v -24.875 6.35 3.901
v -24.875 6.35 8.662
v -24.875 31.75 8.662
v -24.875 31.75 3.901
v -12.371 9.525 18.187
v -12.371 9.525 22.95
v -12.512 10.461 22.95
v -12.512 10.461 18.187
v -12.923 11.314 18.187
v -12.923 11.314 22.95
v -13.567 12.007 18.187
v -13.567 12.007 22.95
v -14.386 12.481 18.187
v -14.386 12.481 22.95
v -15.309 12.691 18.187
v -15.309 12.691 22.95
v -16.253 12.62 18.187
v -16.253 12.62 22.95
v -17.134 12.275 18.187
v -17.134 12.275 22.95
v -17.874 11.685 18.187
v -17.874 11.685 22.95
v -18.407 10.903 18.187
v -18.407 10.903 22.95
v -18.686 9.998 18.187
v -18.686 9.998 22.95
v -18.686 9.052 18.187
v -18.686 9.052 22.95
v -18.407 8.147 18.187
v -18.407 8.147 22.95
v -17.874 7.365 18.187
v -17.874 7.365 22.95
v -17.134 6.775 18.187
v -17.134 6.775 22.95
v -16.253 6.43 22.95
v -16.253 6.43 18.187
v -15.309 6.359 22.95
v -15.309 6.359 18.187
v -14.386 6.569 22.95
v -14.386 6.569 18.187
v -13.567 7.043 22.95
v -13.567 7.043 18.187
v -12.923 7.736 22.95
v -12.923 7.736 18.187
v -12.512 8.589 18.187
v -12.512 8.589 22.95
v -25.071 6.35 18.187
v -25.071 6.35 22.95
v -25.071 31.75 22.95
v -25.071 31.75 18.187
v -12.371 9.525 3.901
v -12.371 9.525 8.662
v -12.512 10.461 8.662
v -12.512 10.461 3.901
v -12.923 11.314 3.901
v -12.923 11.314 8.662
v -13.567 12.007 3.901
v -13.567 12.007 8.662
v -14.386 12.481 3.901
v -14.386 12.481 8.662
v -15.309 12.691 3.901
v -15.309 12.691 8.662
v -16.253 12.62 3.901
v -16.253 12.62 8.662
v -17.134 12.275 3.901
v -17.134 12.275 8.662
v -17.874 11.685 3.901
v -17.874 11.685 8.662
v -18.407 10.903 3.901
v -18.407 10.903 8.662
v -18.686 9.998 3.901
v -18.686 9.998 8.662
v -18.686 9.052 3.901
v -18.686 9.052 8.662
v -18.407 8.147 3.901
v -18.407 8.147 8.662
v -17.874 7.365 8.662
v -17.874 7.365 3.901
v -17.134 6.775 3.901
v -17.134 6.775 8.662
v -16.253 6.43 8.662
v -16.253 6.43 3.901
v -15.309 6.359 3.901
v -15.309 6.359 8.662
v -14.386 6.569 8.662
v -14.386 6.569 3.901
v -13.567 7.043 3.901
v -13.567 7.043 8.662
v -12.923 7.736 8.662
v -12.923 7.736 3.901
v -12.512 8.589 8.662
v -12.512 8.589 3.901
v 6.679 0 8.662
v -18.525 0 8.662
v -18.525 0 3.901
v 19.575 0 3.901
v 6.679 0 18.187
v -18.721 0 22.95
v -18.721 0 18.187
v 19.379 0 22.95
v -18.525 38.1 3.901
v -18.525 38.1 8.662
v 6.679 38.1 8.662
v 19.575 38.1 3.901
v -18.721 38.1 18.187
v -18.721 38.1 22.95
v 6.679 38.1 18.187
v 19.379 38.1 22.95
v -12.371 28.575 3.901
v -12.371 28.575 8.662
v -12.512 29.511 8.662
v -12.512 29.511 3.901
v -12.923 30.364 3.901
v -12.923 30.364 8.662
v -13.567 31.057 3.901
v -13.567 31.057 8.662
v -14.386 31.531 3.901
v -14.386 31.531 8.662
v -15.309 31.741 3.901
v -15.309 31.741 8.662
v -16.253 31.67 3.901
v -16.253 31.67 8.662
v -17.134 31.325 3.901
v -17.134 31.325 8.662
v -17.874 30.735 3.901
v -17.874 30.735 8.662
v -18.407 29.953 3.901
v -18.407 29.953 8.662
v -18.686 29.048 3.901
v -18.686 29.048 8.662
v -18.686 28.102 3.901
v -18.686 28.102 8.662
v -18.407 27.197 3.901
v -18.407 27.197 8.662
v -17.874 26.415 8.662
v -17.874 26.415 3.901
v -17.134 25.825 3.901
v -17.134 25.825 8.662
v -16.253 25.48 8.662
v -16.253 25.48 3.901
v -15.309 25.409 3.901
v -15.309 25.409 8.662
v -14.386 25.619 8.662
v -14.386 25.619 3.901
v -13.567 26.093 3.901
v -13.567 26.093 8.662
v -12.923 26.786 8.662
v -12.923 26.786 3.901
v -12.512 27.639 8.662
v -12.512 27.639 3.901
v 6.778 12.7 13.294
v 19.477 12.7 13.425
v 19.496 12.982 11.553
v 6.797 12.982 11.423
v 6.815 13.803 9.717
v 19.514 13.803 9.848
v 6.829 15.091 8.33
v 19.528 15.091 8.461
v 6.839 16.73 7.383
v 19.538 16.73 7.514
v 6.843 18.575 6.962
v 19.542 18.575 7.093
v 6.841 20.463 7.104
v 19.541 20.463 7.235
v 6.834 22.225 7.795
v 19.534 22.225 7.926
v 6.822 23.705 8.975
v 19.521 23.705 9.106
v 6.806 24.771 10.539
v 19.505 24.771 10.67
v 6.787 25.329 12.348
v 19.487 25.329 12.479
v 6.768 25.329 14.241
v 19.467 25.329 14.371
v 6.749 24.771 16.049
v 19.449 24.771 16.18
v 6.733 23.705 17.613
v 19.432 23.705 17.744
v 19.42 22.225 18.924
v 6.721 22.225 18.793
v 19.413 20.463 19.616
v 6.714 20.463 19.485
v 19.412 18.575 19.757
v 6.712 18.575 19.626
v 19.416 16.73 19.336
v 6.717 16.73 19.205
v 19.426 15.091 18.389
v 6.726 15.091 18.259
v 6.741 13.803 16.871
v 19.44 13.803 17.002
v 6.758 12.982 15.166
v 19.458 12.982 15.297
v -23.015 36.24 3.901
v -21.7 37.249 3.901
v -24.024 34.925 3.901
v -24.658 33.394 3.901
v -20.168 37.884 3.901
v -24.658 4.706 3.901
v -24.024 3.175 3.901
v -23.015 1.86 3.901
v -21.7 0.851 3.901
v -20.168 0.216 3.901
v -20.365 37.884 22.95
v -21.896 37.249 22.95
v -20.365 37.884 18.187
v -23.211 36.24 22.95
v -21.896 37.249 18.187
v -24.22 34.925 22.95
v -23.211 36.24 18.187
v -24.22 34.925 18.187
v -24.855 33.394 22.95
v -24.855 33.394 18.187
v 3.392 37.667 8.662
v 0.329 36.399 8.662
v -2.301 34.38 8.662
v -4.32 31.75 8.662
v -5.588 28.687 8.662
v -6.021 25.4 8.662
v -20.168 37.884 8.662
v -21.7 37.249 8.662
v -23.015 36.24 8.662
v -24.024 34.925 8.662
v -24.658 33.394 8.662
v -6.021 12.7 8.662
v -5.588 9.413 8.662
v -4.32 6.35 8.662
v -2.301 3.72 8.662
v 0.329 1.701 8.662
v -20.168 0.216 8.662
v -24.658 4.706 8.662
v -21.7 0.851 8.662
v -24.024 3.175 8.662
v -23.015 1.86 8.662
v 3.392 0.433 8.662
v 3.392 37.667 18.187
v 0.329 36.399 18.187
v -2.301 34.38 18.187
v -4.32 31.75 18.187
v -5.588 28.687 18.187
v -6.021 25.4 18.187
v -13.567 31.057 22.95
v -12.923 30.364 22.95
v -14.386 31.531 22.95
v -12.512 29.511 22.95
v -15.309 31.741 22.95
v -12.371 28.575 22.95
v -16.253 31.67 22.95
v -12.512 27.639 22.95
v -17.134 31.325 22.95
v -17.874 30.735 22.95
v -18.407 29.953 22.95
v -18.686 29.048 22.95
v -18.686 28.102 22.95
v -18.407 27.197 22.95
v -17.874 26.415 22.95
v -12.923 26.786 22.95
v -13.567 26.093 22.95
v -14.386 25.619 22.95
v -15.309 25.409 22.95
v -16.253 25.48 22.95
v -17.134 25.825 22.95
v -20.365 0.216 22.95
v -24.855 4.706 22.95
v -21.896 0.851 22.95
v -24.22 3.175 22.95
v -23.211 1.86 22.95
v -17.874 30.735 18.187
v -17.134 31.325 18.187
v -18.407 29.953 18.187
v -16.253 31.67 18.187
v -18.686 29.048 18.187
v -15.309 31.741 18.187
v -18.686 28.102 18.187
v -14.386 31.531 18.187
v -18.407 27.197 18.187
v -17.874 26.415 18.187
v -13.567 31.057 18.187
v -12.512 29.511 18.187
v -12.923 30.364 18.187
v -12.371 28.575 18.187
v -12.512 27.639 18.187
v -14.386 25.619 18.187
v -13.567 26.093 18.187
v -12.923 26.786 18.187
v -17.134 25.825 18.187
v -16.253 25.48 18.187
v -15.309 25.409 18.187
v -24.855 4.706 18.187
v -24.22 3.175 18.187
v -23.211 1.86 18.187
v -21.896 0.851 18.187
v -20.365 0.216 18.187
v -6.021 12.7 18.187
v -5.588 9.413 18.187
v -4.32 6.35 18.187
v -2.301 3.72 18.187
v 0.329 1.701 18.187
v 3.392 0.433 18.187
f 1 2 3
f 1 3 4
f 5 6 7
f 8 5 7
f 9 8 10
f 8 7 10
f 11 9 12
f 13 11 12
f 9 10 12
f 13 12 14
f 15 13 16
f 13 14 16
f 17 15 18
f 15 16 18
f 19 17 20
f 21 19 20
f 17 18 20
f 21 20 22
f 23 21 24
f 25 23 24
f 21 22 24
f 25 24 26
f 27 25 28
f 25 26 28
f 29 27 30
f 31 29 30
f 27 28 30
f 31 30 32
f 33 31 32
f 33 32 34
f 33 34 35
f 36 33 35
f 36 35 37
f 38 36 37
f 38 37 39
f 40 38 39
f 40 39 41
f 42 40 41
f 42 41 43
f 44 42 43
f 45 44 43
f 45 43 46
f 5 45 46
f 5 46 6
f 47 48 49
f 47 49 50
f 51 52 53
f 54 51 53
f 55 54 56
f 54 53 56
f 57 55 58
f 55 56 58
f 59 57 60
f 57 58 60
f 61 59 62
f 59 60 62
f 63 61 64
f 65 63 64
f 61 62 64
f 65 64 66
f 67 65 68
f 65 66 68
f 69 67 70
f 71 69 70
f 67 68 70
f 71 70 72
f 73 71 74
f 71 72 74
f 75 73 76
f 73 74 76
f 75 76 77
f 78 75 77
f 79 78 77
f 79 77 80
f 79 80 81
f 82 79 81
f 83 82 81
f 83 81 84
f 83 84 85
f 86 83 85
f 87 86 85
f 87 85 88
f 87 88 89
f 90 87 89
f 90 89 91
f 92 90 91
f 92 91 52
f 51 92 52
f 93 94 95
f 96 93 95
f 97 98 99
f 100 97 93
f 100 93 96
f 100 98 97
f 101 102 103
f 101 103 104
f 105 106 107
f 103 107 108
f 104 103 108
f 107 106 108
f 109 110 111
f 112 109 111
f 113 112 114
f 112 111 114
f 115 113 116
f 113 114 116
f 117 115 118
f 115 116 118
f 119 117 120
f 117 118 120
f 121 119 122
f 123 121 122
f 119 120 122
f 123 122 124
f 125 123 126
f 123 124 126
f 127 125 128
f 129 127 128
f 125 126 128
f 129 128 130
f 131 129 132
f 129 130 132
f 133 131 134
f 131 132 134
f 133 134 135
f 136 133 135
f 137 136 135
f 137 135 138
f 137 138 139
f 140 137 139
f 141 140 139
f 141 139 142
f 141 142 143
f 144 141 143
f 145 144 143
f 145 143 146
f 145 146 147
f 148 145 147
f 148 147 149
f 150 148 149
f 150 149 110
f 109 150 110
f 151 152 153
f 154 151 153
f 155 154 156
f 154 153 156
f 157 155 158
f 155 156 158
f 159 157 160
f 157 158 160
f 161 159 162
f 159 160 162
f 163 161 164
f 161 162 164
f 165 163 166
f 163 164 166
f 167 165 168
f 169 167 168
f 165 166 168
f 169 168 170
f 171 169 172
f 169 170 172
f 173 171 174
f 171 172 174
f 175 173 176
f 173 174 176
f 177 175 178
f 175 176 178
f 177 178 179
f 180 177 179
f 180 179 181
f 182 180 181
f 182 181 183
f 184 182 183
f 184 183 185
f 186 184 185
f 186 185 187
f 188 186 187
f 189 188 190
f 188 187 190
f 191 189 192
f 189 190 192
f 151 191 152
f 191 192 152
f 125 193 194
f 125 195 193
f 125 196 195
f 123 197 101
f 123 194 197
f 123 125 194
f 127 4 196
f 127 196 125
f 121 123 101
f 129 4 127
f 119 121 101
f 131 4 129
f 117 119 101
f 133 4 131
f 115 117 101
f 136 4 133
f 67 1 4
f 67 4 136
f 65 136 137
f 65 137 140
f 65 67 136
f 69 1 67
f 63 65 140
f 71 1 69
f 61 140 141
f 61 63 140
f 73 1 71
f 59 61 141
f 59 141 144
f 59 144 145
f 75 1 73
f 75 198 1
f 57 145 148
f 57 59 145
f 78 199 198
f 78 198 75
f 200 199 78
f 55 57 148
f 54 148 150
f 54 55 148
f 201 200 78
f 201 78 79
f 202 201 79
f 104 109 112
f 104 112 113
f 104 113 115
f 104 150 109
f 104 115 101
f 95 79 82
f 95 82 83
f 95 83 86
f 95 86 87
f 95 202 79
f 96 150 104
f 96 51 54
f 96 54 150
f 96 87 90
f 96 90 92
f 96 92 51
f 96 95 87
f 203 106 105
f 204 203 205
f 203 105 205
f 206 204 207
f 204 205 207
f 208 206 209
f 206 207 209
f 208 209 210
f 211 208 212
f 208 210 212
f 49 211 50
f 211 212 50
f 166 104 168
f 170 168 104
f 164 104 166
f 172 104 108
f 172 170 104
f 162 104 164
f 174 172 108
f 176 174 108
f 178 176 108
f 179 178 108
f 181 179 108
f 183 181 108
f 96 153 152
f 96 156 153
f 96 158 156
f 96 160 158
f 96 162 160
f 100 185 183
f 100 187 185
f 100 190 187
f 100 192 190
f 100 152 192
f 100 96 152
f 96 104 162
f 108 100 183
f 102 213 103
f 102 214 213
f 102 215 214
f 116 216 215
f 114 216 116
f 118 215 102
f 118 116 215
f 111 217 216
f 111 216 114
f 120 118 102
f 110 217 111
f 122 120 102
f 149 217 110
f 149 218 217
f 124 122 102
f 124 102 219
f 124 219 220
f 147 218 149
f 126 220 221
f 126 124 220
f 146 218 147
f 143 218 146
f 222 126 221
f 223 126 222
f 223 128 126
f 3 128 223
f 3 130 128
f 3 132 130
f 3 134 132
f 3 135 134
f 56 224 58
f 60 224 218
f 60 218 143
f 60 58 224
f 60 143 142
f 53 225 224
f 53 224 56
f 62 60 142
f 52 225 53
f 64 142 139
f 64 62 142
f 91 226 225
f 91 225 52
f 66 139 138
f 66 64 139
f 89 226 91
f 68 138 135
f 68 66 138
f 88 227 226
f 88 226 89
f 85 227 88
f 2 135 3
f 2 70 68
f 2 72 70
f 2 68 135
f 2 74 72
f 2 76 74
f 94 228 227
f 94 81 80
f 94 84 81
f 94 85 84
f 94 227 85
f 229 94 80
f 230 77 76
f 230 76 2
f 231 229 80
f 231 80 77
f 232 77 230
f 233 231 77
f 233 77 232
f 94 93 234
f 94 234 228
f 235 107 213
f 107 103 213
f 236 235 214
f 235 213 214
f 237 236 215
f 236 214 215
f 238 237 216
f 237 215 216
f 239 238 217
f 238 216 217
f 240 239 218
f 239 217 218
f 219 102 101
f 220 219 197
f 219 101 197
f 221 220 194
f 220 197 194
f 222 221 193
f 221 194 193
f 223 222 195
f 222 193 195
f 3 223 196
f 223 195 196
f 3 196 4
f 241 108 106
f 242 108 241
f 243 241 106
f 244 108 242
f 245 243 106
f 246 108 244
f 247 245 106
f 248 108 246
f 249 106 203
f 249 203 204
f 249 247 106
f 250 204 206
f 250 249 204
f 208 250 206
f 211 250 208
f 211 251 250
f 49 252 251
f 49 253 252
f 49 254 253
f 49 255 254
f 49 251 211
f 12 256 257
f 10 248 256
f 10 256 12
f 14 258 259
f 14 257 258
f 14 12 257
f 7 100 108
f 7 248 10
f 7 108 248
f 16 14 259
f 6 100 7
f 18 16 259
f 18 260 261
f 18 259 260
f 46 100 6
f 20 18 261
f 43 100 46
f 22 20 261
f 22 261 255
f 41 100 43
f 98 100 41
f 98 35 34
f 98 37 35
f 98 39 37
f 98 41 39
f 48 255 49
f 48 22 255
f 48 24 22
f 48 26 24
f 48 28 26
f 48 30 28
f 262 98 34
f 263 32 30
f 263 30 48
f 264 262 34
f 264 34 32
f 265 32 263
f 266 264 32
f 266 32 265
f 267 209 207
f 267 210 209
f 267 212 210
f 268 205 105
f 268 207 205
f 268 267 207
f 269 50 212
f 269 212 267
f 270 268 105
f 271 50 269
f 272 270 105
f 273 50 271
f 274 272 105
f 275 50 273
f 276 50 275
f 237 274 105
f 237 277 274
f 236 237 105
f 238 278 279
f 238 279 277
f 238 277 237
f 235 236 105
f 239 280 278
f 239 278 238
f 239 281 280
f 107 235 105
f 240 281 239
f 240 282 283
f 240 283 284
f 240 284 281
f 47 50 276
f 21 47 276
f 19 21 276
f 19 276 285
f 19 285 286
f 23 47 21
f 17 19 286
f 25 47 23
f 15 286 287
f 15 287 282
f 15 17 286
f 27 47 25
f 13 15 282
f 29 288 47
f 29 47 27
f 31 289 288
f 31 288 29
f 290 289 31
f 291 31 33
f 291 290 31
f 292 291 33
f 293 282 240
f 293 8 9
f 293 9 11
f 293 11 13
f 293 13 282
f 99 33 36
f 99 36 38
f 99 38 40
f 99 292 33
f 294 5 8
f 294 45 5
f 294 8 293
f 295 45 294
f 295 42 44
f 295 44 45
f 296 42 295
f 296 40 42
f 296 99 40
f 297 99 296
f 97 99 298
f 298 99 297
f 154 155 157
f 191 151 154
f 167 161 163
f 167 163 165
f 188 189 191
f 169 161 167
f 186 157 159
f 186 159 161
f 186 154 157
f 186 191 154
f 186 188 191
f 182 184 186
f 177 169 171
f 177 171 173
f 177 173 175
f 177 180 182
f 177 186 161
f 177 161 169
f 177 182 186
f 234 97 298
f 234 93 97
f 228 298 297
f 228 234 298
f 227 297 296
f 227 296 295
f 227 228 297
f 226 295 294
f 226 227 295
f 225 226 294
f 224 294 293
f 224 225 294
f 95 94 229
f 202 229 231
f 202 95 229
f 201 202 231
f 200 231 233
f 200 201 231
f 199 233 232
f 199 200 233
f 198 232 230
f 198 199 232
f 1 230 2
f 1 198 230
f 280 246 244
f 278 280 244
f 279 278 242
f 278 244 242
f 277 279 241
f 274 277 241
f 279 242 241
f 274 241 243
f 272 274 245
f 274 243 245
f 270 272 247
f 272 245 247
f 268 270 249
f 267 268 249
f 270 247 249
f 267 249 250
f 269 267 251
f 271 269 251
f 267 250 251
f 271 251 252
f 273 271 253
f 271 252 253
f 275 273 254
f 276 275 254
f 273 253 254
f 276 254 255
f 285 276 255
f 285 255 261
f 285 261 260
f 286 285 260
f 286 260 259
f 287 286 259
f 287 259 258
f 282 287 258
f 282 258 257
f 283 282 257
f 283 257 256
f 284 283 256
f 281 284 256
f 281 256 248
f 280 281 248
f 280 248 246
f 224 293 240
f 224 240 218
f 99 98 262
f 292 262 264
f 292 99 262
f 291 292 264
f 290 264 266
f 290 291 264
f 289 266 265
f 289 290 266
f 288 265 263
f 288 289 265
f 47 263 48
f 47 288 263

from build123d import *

# Parameters (mm, degrees)
F1_DEPTH = 38.1
F2_R     = 3.175
F3_DEPTH = 25.4
F4_R     = 6.35
F6_DEPTH = 12.7
F7_R     = 12.7
F8_R     = 12.7


with BuildPart() as f1:
    # F0 (on Front) → F1 (new body)
    with BuildSketch(Plane.XZ):
        Polygon((19.5751538399, 3.9005766285), (19.3787731311, 22.9495643868), (-25.0712268689, 22.9495643868), (-25.0712268689, 18.1870643868), (-6.0212268689, 18.1870643868), (-6.0212268689, 8.6620643868), (-24.8748461601, 8.6620643868), (-24.8748461601, 3.9005766285), align=None)
    extrude(amount=-F1_DEPTH)

    # F2 (on face) → F3 (cut)
    with BuildSketch(Plane.XY.offset(22.9495643868)):
        with Locations((-15.5462268689, 28.575)):
            Circle(F2_R)
        with Locations((-15.5462268689, 9.525)):
            Circle(F2_R)
    extrude(amount=-F3_DEPTH, mode=Mode.SUBTRACT)

    # F4
    f4_edges = [f1.edges().sort_by_distance(p)[0] for p in [
        (-25.071227, 0, 20.568314),
        (-24.874846, 0, 6.281321),
        (-24.874846, 38.1, 6.281321),
        (-25.071227, 38.1, 20.568314),
    ]]
    fillet(f4_edges, radius=F4_R)

    # F5 (on face) → F6 (cut)
    with BuildSketch(Plane(origin=(19.613281335, 0, 0.2021981503), x_dir=(0, 1, 0), z_dir=(0.999946864, 0, 0.0103086986))):
        with BuildLine():
            Line((12.7, 13.2235750059), (25.4, 13.2235750059))
            ThreePointArc((25.4, 13.2235750059), (19.05, 19.5735750059), (12.7, 13.2235750059))
        make_face()
        with BuildLine():
            ThreePointArc((12.7, 13.2235750059), (19.05, 6.8735750059), (25.4, 13.2235750059))
            Line((25.4, 13.2235750059), (12.7, 13.2235750059))
        make_face()
    extrude(amount=-F6_DEPTH, mode=Mode.SUBTRACT)

    # F7
    f7_edges = [f1.edges().sort_by_distance(p)[0] for p in [
        (-6.021227, 0, 13.424564),
    ]]
    fillet(f7_edges, radius=F7_R)

    # F8
    f8_edges = [f1.edges().sort_by_distance(p)[0] for p in [
        (-6.021227, 38.1, 13.424564),
    ]]
    fillet(f8_edges, radius=F8_R)


solid = f1.part
